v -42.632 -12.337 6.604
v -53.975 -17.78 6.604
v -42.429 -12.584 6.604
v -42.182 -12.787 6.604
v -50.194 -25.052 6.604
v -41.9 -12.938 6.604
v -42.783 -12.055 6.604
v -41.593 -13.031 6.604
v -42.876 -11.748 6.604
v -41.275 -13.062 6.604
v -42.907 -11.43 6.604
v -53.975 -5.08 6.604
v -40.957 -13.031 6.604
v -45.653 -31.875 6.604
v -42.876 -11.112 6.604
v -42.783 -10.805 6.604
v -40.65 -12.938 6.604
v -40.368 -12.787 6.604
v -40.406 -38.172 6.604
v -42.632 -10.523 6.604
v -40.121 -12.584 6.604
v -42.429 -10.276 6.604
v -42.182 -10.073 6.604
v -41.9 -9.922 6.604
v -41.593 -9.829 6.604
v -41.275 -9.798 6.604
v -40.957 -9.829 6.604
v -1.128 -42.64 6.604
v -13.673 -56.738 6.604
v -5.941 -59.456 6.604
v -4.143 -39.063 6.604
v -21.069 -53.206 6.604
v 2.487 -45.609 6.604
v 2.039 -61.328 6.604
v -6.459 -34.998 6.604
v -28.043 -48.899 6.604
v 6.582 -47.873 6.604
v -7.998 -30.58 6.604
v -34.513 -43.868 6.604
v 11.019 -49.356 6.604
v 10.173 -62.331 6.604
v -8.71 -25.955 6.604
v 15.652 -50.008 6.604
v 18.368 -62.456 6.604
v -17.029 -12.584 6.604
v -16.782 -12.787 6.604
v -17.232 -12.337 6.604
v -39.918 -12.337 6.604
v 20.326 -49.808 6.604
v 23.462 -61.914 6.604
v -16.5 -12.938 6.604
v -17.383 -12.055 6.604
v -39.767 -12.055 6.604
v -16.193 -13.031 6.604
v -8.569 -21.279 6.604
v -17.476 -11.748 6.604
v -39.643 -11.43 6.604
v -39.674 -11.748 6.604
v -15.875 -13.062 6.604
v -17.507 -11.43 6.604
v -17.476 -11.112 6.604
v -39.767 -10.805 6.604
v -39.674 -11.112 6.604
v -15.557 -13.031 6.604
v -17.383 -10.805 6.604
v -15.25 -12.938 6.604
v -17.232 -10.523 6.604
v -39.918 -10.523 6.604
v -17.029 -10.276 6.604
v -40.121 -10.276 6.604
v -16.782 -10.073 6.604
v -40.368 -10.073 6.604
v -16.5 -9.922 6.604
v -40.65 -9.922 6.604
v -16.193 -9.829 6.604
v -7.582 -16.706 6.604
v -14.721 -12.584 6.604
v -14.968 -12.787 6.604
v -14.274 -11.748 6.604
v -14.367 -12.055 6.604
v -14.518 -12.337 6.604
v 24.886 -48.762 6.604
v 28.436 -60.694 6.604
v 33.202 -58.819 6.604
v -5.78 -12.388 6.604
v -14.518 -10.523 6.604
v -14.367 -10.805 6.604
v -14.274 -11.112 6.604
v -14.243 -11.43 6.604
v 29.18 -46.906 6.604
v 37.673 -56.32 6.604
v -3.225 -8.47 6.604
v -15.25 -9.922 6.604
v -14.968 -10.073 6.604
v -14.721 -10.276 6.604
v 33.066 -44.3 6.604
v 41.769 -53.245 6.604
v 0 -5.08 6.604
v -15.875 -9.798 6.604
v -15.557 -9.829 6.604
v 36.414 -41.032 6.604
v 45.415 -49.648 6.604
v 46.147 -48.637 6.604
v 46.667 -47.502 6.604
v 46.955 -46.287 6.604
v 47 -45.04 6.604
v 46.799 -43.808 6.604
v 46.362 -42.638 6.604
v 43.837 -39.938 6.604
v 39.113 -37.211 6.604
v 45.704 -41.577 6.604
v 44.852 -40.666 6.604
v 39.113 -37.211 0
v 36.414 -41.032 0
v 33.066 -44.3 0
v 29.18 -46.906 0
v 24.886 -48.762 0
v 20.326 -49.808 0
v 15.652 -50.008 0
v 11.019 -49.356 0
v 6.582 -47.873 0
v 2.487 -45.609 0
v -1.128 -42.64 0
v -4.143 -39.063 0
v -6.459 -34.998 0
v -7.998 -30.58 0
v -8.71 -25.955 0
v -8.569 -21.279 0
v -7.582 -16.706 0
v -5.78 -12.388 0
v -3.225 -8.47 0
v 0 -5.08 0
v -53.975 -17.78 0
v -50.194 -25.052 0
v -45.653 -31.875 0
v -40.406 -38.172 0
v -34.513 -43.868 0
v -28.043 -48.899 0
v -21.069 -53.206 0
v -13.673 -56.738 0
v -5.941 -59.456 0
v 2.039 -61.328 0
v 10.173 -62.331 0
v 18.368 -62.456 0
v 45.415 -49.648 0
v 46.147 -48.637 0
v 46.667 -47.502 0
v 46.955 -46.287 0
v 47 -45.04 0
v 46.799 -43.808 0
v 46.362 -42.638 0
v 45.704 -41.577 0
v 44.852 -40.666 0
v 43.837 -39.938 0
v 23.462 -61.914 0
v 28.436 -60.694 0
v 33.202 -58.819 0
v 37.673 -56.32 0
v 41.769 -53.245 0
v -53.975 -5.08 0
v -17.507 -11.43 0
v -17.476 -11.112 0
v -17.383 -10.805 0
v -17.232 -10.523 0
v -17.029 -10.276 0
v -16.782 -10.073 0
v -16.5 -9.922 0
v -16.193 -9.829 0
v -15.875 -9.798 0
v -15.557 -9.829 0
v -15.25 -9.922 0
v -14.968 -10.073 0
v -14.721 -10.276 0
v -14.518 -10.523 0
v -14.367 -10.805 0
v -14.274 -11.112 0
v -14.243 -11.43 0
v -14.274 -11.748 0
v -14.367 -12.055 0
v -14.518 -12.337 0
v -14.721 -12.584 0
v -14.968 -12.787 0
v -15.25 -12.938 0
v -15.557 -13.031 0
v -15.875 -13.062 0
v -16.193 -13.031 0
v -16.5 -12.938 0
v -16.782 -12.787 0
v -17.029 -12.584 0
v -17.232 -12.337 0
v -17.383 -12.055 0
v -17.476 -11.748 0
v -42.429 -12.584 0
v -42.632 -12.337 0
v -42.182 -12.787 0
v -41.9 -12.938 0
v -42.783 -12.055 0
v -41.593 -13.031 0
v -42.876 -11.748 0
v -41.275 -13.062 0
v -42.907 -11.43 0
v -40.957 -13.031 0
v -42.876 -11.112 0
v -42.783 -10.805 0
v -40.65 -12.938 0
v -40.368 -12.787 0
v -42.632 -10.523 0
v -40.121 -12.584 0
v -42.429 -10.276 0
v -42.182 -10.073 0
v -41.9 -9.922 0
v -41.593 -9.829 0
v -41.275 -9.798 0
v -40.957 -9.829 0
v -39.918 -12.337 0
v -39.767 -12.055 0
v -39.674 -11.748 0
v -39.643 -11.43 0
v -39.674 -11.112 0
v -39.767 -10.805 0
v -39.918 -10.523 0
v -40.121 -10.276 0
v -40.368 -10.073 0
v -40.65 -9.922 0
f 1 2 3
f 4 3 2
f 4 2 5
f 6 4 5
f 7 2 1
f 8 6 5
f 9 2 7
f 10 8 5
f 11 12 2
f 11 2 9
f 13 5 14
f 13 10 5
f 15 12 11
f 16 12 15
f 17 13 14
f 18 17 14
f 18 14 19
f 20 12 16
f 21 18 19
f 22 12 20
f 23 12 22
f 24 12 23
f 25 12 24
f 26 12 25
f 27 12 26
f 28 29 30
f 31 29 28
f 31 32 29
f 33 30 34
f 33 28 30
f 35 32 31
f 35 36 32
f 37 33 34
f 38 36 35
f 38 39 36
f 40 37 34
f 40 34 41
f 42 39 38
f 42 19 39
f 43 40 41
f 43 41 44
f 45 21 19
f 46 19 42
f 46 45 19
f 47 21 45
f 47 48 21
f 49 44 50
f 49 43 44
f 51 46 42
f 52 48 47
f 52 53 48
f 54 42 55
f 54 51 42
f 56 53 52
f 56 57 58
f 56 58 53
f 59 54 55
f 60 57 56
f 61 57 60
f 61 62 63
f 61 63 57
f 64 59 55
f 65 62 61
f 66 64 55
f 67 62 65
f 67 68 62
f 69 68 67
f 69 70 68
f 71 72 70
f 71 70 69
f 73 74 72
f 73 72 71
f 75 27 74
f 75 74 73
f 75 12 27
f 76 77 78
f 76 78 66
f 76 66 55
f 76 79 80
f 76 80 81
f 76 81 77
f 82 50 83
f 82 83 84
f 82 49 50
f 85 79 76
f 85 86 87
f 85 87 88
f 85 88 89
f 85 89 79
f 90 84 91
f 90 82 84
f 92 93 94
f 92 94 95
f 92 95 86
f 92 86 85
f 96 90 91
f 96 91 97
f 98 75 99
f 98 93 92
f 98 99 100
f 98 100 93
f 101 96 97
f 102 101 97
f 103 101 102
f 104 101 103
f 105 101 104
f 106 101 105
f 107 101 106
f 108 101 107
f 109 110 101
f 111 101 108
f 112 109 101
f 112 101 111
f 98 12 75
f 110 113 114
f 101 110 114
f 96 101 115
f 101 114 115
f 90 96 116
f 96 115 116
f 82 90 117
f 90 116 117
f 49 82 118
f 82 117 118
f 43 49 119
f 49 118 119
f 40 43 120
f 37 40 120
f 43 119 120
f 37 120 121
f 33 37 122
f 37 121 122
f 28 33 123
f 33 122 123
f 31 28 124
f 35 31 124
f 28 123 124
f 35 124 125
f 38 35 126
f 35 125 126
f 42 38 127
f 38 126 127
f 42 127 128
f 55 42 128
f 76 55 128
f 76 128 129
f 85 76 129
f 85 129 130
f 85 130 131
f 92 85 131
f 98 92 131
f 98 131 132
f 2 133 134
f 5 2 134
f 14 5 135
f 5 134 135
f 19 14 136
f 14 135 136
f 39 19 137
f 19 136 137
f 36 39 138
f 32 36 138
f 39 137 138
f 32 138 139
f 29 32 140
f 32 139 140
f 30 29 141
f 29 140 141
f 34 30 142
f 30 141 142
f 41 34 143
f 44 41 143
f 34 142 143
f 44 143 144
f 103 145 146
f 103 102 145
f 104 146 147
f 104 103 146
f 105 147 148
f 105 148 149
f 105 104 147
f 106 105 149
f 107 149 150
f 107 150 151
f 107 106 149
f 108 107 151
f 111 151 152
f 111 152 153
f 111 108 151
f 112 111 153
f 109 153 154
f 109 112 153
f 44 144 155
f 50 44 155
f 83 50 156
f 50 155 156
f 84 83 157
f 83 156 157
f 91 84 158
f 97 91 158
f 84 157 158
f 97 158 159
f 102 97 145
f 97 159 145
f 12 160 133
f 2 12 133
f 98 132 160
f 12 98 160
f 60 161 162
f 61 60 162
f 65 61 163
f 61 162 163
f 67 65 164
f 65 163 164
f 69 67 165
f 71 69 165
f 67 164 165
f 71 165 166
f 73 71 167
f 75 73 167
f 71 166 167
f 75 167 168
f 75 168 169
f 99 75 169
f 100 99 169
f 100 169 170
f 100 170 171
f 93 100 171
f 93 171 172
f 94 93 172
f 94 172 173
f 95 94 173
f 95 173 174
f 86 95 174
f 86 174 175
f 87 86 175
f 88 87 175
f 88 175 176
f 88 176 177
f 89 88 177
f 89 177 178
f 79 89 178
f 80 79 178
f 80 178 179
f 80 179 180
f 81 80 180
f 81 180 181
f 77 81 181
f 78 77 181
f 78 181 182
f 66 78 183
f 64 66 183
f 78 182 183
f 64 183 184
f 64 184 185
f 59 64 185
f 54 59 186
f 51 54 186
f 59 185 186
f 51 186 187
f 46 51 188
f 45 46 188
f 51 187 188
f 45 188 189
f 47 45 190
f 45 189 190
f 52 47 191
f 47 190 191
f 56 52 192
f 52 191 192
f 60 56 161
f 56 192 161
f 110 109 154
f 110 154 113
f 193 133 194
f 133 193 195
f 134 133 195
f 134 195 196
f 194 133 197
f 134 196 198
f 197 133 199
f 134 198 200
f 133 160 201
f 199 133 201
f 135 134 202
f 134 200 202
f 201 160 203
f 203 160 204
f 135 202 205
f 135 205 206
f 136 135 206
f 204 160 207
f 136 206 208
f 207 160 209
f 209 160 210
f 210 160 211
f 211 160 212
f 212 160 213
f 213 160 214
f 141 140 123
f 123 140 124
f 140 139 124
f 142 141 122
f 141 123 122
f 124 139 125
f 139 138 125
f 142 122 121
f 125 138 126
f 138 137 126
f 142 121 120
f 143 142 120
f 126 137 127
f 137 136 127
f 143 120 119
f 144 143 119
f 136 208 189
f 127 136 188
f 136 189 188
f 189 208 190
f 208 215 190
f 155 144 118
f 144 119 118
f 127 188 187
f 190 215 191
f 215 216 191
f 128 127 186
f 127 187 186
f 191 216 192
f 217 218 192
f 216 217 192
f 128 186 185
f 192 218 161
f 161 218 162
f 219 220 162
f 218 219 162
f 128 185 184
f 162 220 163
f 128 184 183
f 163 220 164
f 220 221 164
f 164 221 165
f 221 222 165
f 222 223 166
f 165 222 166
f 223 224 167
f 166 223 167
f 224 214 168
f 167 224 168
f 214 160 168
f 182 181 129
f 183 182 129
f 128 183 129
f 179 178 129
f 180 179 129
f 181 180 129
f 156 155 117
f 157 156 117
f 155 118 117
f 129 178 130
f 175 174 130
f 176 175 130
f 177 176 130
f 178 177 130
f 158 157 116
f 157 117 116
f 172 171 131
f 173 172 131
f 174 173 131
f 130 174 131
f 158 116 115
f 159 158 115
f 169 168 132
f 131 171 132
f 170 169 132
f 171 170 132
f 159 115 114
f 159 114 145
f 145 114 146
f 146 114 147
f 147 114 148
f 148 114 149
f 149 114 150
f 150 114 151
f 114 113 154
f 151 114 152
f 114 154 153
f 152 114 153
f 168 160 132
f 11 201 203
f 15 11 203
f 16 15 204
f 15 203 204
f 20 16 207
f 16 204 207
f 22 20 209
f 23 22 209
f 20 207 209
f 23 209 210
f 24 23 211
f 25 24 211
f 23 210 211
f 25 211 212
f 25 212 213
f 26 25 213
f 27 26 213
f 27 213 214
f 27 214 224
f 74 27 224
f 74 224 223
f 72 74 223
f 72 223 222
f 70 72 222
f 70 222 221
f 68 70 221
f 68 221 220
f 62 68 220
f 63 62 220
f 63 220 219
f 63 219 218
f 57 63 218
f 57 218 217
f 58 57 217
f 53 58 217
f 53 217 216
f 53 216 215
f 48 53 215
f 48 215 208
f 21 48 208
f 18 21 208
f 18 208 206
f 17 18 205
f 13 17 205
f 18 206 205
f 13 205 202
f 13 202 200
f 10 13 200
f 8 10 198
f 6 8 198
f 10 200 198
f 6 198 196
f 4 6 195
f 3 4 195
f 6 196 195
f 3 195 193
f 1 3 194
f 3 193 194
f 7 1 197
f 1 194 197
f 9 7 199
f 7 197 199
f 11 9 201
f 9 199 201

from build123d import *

# Parameters (mm, degrees)
BOSS_EXTRUDE1_DEPTH       = 6.604
FILLET1_R                 = 6.35
F_4_CLEARANCE_HOLE1_D     = 3.2639
F_4_CLEARANCE_HOLE1_DEPTH = 9.652
F_4_CLEARANCE_HOLE1_TIP   = 0.980574487


with BuildPart() as part:
    # Sketch1 → Boss-Extrude1 (new body)
    with BuildSketch(Plane.XY):
        with BuildLine():
            Line((-6.35, -5.08), (-53.975, -5.08))
            Line((-53.975, -5.08), (-53.975, -17.78))
            ThreePointArc((-53.975, -17.78), (-24.613831362, -51.146124163), (18.36841389, -62.455547599))
            ThreePointArc((18.36841389, -62.455547599), (36.58027843, -57.005297746), (49.891818948, -43.434))
            Line((49.891818948, -43.434), (39.113266772, -37.211))
            ThreePointArc((39.113266772, -37.211), (0.611966481, -44.206961223), (0, -5.08))
            Line((0, -5.08), (-6.35, -5.08))
        make_face()
    extrude(amount=BOSS_EXTRUDE1_DEPTH)

    # Fillet1
    fillet1_edges = [part.edges().sort_by_distance(p)[0] for p in [
        (49.891818948, -43.434, 3.302),
    ]]
    fillet(fillet1_edges, radius=FILLET1_R)

    # #4 Clearance Hole1
    with Locations(Plane(origin=(-15.875, -11.43, 6.604), x_dir=(1, 0, 0), z_dir=(0, 0, 1))):
        with Locations((0, 0), (-25.4, 0)):
            Hole(F_4_CLEARANCE_HOLE1_D / 2, depth=F_4_CLEARANCE_HOLE1_DEPTH)
            with Locations((0, 0, -(F_4_CLEARANCE_HOLE1_DEPTH + F_4_CLEARANCE_HOLE1_TIP / 2))):  # 118° drill point
                Cone(0, F_4_CLEARANCE_HOLE1_D / 2, F_4_CLEARANCE_HOLE1_TIP, mode=Mode.SUBTRACT)


solid = part.part
